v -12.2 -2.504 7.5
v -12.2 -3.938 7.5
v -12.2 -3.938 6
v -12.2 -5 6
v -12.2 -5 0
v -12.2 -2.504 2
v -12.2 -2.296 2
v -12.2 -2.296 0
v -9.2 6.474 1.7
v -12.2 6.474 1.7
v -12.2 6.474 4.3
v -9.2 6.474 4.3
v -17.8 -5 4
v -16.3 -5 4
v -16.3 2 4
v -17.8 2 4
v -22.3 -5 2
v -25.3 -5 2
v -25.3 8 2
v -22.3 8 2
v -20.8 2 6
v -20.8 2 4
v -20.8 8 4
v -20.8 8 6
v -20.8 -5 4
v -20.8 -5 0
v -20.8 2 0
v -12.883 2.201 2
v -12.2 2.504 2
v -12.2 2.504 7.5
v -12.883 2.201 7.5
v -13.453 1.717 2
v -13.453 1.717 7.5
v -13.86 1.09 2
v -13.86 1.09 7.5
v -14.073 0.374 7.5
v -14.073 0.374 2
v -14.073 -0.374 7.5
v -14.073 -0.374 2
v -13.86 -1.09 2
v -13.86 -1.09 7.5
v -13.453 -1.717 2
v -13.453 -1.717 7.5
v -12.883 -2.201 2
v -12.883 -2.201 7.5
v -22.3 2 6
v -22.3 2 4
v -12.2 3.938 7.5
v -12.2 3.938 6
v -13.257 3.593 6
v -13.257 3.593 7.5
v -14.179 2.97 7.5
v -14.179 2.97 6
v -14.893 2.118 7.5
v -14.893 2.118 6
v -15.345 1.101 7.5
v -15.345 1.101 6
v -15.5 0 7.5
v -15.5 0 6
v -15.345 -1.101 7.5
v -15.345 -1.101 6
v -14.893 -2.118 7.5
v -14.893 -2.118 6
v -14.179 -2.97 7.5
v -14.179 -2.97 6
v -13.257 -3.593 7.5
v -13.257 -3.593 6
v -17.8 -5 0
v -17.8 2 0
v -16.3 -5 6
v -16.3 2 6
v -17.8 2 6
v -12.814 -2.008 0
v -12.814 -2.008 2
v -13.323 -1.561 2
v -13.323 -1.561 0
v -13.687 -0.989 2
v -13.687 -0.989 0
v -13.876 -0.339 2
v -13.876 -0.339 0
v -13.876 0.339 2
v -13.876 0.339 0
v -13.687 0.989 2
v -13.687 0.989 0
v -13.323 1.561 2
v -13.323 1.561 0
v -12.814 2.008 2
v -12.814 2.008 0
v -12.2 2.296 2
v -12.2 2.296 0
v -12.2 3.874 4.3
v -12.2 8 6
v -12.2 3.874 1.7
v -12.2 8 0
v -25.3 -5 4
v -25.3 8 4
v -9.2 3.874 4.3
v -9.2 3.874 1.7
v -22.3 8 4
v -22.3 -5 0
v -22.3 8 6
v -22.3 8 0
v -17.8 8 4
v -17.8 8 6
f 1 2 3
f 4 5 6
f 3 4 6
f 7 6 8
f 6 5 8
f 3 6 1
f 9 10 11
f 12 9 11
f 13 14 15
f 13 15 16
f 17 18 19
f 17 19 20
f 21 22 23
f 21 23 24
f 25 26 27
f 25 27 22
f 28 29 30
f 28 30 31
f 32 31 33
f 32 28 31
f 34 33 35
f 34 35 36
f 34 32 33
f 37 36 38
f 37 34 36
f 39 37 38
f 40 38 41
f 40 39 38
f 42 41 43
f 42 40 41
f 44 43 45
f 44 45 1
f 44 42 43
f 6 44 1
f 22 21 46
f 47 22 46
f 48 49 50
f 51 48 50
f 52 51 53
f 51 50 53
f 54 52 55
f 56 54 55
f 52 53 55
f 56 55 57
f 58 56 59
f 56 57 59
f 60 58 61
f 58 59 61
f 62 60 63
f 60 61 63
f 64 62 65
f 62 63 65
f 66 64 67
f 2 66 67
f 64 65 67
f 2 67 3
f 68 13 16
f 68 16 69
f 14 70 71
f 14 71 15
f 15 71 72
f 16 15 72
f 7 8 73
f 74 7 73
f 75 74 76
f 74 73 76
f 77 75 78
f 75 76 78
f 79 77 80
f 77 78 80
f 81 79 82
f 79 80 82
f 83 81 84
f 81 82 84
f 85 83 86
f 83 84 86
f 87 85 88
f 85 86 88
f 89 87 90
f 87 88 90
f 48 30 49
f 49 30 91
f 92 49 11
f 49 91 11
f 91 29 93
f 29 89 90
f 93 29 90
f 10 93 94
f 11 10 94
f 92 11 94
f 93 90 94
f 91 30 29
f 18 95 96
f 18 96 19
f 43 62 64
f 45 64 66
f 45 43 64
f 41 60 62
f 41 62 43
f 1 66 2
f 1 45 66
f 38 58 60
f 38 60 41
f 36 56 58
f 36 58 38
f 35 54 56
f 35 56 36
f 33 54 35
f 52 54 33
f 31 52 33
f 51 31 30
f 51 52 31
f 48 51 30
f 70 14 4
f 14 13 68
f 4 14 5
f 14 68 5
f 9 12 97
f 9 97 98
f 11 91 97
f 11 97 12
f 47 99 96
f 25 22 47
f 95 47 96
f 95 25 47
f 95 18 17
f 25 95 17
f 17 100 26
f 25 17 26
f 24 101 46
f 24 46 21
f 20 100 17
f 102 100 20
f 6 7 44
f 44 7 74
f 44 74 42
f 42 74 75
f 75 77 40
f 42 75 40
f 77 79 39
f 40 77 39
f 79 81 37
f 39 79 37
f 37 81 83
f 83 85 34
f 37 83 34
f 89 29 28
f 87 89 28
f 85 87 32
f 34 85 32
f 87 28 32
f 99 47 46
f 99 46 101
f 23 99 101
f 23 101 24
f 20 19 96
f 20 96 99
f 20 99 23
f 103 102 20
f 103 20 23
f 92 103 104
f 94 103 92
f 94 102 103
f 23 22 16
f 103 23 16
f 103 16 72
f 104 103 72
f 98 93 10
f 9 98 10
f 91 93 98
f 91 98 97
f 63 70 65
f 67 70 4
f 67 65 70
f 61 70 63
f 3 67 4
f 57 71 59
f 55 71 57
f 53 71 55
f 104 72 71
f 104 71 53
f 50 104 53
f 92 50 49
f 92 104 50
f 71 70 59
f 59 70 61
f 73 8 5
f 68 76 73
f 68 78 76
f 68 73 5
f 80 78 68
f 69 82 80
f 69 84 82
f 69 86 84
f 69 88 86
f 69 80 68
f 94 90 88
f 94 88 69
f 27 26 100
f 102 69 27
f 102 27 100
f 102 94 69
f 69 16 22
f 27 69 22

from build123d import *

# Parameters (mm, degrees)
SKETCH1_R            = 1
BOSS_EXTRUDE1_DEPTH  = 6
SKETCH2_R            = 2.6
CUT_EXTRUDE1_DEPTH   = 6
SKETCH3_W            = 7.6
SKETCH3_H            = 13
BOSS_EXTRUDE2_DEPTH  = 6
BOSS_EXTRUDE5_START  = -5
SKETCH6_W            = 3
SKETCH6_H            = 2
BOSS_EXTRUDE5_DEPTH  = 13
SKETCH10_R           = 4
SKETCH10_R_2         = 2.6
BOSS_EXTRUDE6_DEPTH  = 1.5
SKETCH12_R           = 2.6
SKETCH12_R_2         = 2.4
BOSS_EXTRUDE7_DEPTH  = 2
CUT_EXTRUDE2_DEPTH   = 7
SKETCH14_W           = 3
SKETCH14_H           = 2
CUT_EXTRUDE3_DEPTH   = 7
SKETCH15_W           = 0.2
SKETCH15_H           = 13
CUT_EXTRUDE4_DEPTH   = 9.5
SKETCH16_W           = 3
SKETCH16_H           = 3
CUT_EXTRUDE5_DEPTH   = 3
BOSS_EXTRUDE8_START  = 0.2
SKETCH16_3_W         = 2.6
SKETCH16_3_H         = 2.6
BOSS_EXTRUDE8_DEPTH  = 3
BOSS_EXTRUDE9_START  = -24.2
SKETCH16_4_W         = 2.6
SKETCH16_4_H         = 2.6
BOSS_EXTRUDE9_DEPTH  = 3
SKETCH17_W           = 29.7
SKETCH17_H           = 13
CUT_EXTRUDE6_DEPTH   = 10
SKETCH18_W           = 2.6
SKETCH18_H           = 2.6
BOSS_EXTRUDE10_DEPTH = 3


with BuildPart() as part:
    # Sketch1 → Boss-Extrude1 (new body)
    with BuildSketch(Plane.XY):
        with BuildLine():
            ThreePointArc((3.75, -5), (4.47902769, -4.358991965), (5.1, -3.61282438))
            Line((5.1, -3.61282438), (5.1, 3.61282438))
            ThreePointArc((5.1, 3.61282438), (0, 6.25), (-5.1, 3.61282438))
            Line((-5.1, 3.61282438), (-5.1, -3.61282438))
            ThreePointArc((-5.1, -3.61282438), (-4.47902769, -4.358991965), (-3.75, -5))
            Line((-3.75, -5), (-14.7, -5))
            Line((-14.7, -5), (-14.7, 8))
            Line((-14.7, 8), (14.7, 8))
            Line((14.7, 8), (14.7, -5))
            Line((14.7, -5), (3.75, -5))
        make_face()
        with Locations((11.5, 0)):
            Circle(SKETCH1_R, mode=Mode.SUBTRACT)
        with Locations((-11.5, 0)):
            Circle(SKETCH1_R, mode=Mode.SUBTRACT)
    extrude(amount=BOSS_EXTRUDE1_DEPTH)

    # Sketch2 → Cut-Extrude1 (cut)
    with BuildSketch(Plane.XY):
        with Locations((-11.5, 0)):
            Circle(SKETCH2_R)
        with Locations((11.5, 0)):
            Circle(SKETCH2_R)
    extrude(amount=CUT_EXTRUDE1_DEPTH, mode=Mode.SUBTRACT)

    # Sketch3 → Boss-Extrude2 (add)
    with BuildSketch(Plane.XY):
        with Locations((-18.5, 1.5)):
            Rectangle(SKETCH3_W, SKETCH3_H)
    extrude(amount=BOSS_EXTRUDE2_DEPTH)

    # Sketch6 → Boss-Extrude5 (add)
    with BuildSketch(Plane(origin=(0, 0, 0), x_dir=(1, 0, 0), z_dir=(0, 1, 0)).offset(BOSS_EXTRUDE5_START)):
        with Locations((-23.8, -3)):
            Rectangle(SKETCH6_W, SKETCH6_H)
        with Locations((16.2, -3)):
            Rectangle(SKETCH6_W, SKETCH6_H)
    extrude(amount=BOSS_EXTRUDE5_DEPTH)

    # Sketch10 → Boss-Extrude6 (add)
    with BuildSketch(Plane.XY.offset(6)):
        with Locations((-11.5, 0)):
            Circle(SKETCH10_R)
        with Locations((-11.5, 0)):
            Circle(SKETCH10_R_2, mode=Mode.SUBTRACT)
        with BuildLine():
            Line((14.7, 2.4), (14.7, -2.4))
            ThreePointArc((14.7, -2.4), (7.5, 0), (14.7, 2.4))
        make_face()
        with Locations((11.5, 0)):
            Circle(SKETCH10_R_2, mode=Mode.SUBTRACT)
    extrude(amount=BOSS_EXTRUDE6_DEPTH)

    # Sketch12 → Boss-Extrude7 (add)
    with BuildSketch(Plane(origin=(0, 0, 0), x_dir=(-1, 0, 0), z_dir=(0, 0, -1))):
        with Locations((11.5, 0)):
            Circle(SKETCH12_R)
        with Locations((11.5, 0)):
            Circle(SKETCH12_R_2, mode=Mode.SUBTRACT)
        with Locations((-11.5, 0)):
            Circle(SKETCH12_R)
        with Locations((-11.5, 0)):
            Circle(SKETCH12_R_2, mode=Mode.SUBTRACT)
    extrude(amount=-BOSS_EXTRUDE7_DEPTH)

    # Sketch13 → Cut-Extrude2 (cut)
    with BuildSketch(Plane.XZ.offset(5)):
        Polygon((-22.3, 6), (-16.3, 6), (-16.3, 4), (-17.8, 4), (-17.8, 0), (-20.8, 0), (-20.8, 4), (-22.3, 4), align=None)
    extrude(amount=-CUT_EXTRUDE2_DEPTH, mode=Mode.SUBTRACT)

    # Sketch14 → Cut-Extrude3 (cut)
    with BuildSketch(Plane.XZ.offset(-2)):
        with Locations((-19.3, 5)):
            Rectangle(SKETCH14_W, SKETCH14_H)
    extrude(amount=-CUT_EXTRUDE3_DEPTH, mode=Mode.SUBTRACT)

    # Sketch15 → Cut-Extrude4 (cut, symmetric)
    with BuildSketch(Plane.XY):
        with Locations((-12.1, 1.5)):
            Rectangle(SKETCH15_W, SKETCH15_H)
        with Locations((12.1, 1.5)):
            Rectangle(SKETCH15_W, SKETCH15_H)
    extrude(amount=CUT_EXTRUDE4_DEPTH, both=True, mode=Mode.SUBTRACT)

    # Sketch16 → Cut-Extrude5 (cut)
    with BuildSketch(Plane.ZY.offset(12)):
        with Locations((3, 5.173669459)):
            Rectangle(SKETCH16_W, SKETCH16_H)
    cut_extrude5 = extrude(amount=-CUT_EXTRUDE5_DEPTH, mode=Mode.SUBTRACT)

    # Mirror1: Cut-Extrude5 across plane
    add(cut_extrude5.mirror(Plane(origin=(0, 0, 0), x_dir=(0, 0, 1), z_dir=(1, 0, 0))), mode=Mode.SUBTRACT)

    # Sketch16<3> → Boss-Extrude8 (add)
    with BuildSketch(Plane.ZY.offset(12).offset(BOSS_EXTRUDE8_START)):
        with Locations((3, 5.173669459)):
            Rectangle(SKETCH16_3_W, SKETCH16_3_H)
    extrude(amount=-BOSS_EXTRUDE8_DEPTH)

    # Sketch16<4> → Boss-Extrude9 (add)
    with BuildSketch(Plane.ZY.offset(12).offset(BOSS_EXTRUDE9_START)):
        with Locations((3, 5.173669459)):
            Rectangle(SKETCH16_4_W, SKETCH16_4_H)
    extrude(amount=BOSS_EXTRUDE9_DEPTH)

    # Sketch17 → Cut-Extrude6 (cut)
    with BuildSketch(Plane.XY):
        with Locations((2.85, 1.5)):
            Rectangle(SKETCH17_W, SKETCH17_H)
    extrude(amount=CUT_EXTRUDE6_DEPTH, mode=Mode.SUBTRACT)

    # Sketch18 → Boss-Extrude10 (add)
    with BuildSketch(Plane(origin=(-12.2, 0, 0), x_dir=(0, 0, -1), z_dir=(1, 0, 0))):
        with Locations((-3, 5.173669459)):
            Rectangle(SKETCH18_W, SKETCH18_H)
    extrude(amount=BOSS_EXTRUDE10_DEPTH)


solid = part.part
